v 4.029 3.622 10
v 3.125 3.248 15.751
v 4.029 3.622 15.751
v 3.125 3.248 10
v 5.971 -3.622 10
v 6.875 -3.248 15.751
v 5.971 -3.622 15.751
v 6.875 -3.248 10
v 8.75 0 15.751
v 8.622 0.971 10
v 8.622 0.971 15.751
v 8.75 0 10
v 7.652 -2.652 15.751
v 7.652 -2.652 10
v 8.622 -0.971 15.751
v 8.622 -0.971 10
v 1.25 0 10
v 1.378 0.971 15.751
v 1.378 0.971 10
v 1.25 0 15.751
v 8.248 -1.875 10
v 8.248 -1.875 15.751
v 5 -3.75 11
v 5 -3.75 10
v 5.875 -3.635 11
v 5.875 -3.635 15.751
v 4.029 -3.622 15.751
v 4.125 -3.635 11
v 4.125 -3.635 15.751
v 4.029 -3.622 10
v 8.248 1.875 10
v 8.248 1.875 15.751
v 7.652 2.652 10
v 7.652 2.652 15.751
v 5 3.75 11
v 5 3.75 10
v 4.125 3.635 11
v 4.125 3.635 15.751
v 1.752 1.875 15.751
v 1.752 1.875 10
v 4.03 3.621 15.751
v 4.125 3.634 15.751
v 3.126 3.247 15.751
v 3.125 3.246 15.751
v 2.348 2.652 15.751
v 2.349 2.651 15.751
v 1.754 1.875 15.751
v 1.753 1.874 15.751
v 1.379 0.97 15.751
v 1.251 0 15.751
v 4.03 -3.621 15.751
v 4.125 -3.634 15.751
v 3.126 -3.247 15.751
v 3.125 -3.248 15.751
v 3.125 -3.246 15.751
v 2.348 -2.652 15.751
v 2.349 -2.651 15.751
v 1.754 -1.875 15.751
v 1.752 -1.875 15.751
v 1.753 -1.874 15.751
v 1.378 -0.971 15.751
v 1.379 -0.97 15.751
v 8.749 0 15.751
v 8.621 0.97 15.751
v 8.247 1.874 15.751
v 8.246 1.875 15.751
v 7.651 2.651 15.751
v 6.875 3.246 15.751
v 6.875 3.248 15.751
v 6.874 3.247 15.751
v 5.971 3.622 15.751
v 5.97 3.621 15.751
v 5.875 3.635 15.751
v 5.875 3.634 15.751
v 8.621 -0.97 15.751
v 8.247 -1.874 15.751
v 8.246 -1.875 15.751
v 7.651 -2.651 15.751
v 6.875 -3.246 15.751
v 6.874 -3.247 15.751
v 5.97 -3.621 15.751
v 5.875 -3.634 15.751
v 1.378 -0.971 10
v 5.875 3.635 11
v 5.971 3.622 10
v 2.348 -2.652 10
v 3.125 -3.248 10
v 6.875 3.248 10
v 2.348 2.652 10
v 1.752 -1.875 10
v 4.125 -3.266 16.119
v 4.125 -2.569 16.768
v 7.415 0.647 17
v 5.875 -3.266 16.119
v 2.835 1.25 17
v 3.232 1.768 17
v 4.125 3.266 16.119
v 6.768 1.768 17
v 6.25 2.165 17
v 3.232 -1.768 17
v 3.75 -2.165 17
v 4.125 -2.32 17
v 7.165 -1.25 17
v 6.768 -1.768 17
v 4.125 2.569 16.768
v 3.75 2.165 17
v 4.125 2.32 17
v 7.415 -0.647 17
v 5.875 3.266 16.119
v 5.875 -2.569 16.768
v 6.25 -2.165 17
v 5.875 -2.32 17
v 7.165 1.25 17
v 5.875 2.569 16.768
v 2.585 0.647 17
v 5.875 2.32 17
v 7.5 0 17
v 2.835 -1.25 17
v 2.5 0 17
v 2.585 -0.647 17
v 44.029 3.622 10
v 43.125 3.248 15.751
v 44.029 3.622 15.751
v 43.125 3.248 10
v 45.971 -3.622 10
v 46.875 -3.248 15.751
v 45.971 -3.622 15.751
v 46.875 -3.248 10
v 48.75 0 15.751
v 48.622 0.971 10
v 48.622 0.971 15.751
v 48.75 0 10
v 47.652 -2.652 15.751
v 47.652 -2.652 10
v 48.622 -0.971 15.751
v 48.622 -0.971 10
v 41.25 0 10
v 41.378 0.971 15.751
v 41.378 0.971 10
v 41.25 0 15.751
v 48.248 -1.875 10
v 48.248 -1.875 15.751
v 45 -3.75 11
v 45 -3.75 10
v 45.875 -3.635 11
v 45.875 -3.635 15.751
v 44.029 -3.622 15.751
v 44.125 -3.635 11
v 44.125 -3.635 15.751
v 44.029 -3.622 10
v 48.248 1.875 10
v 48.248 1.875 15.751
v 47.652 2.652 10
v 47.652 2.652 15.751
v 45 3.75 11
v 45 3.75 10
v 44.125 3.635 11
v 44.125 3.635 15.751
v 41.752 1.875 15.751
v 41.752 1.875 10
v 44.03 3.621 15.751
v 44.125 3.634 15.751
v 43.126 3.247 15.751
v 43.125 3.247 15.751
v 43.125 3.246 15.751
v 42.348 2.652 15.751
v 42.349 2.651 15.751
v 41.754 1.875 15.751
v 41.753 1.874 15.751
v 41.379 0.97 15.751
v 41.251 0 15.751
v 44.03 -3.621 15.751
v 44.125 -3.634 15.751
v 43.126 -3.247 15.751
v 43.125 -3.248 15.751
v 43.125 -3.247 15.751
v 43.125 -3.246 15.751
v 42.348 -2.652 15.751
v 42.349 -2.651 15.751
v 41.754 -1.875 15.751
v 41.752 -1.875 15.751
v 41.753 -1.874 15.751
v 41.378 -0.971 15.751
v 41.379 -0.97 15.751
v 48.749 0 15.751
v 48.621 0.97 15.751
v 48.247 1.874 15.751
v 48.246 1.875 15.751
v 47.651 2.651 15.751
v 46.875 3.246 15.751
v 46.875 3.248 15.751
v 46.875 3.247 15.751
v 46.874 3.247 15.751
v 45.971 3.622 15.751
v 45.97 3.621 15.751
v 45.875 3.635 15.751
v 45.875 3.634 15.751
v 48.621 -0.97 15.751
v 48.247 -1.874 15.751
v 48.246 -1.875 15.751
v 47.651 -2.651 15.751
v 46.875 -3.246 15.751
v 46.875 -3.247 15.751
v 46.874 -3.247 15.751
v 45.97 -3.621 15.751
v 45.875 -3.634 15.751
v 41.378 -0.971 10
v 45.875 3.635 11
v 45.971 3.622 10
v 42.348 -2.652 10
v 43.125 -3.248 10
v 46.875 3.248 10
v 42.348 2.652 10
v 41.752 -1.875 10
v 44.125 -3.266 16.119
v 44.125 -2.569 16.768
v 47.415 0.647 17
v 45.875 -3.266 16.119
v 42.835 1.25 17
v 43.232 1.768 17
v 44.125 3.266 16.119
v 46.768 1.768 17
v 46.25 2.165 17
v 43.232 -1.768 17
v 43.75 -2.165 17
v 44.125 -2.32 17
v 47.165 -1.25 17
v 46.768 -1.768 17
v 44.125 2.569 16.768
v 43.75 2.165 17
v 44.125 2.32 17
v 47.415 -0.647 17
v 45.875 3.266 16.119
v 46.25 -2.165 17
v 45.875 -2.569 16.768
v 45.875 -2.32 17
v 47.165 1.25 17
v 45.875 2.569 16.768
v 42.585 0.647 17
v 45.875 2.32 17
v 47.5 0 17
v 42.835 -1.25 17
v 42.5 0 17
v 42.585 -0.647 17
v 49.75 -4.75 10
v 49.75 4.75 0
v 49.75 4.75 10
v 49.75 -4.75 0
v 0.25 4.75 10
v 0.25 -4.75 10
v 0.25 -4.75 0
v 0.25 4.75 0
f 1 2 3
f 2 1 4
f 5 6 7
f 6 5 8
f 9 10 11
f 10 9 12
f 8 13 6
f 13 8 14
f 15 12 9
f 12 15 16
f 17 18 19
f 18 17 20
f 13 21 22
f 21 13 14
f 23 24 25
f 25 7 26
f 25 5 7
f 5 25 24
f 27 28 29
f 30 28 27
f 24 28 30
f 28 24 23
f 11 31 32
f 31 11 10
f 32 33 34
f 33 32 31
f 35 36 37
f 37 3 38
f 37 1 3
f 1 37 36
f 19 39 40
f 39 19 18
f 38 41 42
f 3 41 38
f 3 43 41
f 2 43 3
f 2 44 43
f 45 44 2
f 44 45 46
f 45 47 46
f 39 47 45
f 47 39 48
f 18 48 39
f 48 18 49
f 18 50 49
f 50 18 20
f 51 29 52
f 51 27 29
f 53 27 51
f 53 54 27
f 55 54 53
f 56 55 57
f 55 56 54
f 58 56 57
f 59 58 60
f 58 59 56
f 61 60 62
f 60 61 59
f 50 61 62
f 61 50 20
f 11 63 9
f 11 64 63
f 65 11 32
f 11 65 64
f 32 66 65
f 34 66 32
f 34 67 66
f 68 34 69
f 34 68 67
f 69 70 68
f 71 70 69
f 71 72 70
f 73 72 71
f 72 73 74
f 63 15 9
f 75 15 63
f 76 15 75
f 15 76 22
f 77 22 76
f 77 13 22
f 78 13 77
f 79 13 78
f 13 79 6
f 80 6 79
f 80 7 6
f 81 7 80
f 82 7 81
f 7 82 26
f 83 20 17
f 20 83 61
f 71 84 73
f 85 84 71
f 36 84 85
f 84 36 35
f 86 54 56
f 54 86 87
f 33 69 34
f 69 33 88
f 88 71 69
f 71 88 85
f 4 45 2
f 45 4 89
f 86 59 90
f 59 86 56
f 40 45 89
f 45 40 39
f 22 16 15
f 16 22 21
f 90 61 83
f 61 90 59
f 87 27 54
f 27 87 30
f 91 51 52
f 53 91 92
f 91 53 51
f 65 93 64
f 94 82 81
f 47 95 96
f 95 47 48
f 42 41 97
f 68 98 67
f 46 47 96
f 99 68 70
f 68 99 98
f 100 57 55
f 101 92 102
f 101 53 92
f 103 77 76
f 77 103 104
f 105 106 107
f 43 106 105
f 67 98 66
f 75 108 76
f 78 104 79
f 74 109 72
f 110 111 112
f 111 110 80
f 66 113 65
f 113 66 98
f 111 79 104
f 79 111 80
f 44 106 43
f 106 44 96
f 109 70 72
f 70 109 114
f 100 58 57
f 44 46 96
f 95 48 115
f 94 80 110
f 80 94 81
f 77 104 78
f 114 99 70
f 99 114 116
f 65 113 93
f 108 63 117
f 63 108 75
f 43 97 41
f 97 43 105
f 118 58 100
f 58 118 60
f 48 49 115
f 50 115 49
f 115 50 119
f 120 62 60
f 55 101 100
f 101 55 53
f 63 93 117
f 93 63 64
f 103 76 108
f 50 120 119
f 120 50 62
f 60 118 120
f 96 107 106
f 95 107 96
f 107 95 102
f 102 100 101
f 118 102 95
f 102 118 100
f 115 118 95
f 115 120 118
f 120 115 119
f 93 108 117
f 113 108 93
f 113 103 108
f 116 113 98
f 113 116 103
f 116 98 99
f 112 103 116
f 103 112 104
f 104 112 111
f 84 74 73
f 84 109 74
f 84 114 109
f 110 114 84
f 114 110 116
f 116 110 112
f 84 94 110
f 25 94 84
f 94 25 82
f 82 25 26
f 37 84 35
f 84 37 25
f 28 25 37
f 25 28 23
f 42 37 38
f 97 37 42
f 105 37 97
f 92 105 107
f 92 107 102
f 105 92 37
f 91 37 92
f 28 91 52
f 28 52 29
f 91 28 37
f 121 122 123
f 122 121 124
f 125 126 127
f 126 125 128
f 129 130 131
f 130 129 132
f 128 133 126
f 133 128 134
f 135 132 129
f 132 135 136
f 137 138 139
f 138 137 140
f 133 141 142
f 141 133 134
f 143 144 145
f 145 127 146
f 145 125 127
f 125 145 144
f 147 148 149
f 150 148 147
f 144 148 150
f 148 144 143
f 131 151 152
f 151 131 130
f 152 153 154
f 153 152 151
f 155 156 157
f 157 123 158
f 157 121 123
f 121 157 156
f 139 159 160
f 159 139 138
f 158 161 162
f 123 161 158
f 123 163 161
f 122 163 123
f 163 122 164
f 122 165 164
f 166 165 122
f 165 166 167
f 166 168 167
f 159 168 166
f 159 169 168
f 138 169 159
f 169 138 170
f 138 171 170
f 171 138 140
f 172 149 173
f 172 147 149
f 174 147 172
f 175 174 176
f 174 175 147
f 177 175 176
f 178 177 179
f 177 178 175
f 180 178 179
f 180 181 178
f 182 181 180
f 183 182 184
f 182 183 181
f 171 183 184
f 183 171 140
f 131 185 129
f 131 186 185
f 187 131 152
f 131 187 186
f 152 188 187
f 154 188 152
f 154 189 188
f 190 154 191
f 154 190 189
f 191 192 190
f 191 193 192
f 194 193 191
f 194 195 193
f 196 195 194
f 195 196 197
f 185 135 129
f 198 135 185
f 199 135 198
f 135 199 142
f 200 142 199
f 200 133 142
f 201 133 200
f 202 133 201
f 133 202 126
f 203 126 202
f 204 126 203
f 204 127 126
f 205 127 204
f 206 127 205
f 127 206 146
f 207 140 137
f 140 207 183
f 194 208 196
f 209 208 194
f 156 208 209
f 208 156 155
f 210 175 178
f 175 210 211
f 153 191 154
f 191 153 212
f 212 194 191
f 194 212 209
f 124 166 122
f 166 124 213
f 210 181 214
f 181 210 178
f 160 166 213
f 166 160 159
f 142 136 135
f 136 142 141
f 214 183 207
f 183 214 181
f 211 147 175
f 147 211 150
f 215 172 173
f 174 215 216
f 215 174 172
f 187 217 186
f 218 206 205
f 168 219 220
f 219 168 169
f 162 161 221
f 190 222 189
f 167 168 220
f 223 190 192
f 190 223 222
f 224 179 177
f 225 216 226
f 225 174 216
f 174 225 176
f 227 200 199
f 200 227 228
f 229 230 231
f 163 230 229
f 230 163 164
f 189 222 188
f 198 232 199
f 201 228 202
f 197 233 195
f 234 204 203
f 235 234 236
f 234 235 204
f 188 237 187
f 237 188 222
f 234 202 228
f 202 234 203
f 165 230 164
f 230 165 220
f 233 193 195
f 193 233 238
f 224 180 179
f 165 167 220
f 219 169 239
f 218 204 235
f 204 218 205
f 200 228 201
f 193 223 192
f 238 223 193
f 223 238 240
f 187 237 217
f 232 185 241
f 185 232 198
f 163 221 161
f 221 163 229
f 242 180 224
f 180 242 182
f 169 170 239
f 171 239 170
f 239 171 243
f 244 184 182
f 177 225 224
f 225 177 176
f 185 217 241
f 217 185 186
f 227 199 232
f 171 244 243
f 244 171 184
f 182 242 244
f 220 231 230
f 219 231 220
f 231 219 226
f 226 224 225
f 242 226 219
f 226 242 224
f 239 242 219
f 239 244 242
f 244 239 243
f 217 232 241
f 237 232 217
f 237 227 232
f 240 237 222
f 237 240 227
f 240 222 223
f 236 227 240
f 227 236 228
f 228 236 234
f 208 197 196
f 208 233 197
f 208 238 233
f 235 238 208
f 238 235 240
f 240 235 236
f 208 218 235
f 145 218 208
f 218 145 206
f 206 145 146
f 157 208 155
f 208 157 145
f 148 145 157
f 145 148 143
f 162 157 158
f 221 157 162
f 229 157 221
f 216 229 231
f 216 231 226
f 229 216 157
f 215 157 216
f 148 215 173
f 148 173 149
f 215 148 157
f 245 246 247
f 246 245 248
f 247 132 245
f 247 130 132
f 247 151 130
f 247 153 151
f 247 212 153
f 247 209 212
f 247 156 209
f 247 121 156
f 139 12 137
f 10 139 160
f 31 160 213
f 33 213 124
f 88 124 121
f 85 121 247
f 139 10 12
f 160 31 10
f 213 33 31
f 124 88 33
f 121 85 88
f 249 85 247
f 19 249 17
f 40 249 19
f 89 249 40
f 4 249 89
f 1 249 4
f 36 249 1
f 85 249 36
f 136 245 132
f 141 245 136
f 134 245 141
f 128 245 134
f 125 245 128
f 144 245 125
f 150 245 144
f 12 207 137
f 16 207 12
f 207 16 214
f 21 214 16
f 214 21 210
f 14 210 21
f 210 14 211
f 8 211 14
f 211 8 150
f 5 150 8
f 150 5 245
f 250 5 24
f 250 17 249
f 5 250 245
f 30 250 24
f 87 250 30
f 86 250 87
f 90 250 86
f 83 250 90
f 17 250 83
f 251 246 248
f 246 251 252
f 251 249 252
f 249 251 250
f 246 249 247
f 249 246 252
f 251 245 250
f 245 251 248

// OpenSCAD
knobDiameter = 8;
knobHeight = 7;
pieceLength = 5;
baseDimension = 10;
tolerance = 0.25;
cutWidth = 1.75;
cutHeight = 6;
chamfer = 1.25;

module dummy() {}

nudge = 0.001;

module chamferedCylinder(d=10,r=undef,h=10,chamfer=1) {
    diameter = r==undef ? d : 2*r;
    cylinder(d=diameter,h=h-chamfer+0.001);
    translate([0,0,h-chamfer])
    cylinder(d1=diameter,d2=diameter-chamfer*2,h=chamfer);
}

module knob() {
    render(convexity=2)
    difference() {
        translate([0,0,-nudge])
            chamferedCylinder(d=knobDiameter-2*tolerance,h=knobHeight+nudge,chamfer=chamfer,$fn=24);
        translate([-cutWidth/2,-knobDiameter/2,knobHeight-cutHeight]) cube([cutWidth,knobDiameter,cutHeight+nudge]);
    }
}

translate([tolerance,tolerance-baseDimension/2,0])
cube([pieceLength*baseDimension-2*tolerance,baseDimension-2*tolerance,baseDimension]);
translate([baseDimension/2,0,baseDimension]) knob();
translate([pieceLength*baseDimension-baseDimension/2,0,baseDimension]) knob();
